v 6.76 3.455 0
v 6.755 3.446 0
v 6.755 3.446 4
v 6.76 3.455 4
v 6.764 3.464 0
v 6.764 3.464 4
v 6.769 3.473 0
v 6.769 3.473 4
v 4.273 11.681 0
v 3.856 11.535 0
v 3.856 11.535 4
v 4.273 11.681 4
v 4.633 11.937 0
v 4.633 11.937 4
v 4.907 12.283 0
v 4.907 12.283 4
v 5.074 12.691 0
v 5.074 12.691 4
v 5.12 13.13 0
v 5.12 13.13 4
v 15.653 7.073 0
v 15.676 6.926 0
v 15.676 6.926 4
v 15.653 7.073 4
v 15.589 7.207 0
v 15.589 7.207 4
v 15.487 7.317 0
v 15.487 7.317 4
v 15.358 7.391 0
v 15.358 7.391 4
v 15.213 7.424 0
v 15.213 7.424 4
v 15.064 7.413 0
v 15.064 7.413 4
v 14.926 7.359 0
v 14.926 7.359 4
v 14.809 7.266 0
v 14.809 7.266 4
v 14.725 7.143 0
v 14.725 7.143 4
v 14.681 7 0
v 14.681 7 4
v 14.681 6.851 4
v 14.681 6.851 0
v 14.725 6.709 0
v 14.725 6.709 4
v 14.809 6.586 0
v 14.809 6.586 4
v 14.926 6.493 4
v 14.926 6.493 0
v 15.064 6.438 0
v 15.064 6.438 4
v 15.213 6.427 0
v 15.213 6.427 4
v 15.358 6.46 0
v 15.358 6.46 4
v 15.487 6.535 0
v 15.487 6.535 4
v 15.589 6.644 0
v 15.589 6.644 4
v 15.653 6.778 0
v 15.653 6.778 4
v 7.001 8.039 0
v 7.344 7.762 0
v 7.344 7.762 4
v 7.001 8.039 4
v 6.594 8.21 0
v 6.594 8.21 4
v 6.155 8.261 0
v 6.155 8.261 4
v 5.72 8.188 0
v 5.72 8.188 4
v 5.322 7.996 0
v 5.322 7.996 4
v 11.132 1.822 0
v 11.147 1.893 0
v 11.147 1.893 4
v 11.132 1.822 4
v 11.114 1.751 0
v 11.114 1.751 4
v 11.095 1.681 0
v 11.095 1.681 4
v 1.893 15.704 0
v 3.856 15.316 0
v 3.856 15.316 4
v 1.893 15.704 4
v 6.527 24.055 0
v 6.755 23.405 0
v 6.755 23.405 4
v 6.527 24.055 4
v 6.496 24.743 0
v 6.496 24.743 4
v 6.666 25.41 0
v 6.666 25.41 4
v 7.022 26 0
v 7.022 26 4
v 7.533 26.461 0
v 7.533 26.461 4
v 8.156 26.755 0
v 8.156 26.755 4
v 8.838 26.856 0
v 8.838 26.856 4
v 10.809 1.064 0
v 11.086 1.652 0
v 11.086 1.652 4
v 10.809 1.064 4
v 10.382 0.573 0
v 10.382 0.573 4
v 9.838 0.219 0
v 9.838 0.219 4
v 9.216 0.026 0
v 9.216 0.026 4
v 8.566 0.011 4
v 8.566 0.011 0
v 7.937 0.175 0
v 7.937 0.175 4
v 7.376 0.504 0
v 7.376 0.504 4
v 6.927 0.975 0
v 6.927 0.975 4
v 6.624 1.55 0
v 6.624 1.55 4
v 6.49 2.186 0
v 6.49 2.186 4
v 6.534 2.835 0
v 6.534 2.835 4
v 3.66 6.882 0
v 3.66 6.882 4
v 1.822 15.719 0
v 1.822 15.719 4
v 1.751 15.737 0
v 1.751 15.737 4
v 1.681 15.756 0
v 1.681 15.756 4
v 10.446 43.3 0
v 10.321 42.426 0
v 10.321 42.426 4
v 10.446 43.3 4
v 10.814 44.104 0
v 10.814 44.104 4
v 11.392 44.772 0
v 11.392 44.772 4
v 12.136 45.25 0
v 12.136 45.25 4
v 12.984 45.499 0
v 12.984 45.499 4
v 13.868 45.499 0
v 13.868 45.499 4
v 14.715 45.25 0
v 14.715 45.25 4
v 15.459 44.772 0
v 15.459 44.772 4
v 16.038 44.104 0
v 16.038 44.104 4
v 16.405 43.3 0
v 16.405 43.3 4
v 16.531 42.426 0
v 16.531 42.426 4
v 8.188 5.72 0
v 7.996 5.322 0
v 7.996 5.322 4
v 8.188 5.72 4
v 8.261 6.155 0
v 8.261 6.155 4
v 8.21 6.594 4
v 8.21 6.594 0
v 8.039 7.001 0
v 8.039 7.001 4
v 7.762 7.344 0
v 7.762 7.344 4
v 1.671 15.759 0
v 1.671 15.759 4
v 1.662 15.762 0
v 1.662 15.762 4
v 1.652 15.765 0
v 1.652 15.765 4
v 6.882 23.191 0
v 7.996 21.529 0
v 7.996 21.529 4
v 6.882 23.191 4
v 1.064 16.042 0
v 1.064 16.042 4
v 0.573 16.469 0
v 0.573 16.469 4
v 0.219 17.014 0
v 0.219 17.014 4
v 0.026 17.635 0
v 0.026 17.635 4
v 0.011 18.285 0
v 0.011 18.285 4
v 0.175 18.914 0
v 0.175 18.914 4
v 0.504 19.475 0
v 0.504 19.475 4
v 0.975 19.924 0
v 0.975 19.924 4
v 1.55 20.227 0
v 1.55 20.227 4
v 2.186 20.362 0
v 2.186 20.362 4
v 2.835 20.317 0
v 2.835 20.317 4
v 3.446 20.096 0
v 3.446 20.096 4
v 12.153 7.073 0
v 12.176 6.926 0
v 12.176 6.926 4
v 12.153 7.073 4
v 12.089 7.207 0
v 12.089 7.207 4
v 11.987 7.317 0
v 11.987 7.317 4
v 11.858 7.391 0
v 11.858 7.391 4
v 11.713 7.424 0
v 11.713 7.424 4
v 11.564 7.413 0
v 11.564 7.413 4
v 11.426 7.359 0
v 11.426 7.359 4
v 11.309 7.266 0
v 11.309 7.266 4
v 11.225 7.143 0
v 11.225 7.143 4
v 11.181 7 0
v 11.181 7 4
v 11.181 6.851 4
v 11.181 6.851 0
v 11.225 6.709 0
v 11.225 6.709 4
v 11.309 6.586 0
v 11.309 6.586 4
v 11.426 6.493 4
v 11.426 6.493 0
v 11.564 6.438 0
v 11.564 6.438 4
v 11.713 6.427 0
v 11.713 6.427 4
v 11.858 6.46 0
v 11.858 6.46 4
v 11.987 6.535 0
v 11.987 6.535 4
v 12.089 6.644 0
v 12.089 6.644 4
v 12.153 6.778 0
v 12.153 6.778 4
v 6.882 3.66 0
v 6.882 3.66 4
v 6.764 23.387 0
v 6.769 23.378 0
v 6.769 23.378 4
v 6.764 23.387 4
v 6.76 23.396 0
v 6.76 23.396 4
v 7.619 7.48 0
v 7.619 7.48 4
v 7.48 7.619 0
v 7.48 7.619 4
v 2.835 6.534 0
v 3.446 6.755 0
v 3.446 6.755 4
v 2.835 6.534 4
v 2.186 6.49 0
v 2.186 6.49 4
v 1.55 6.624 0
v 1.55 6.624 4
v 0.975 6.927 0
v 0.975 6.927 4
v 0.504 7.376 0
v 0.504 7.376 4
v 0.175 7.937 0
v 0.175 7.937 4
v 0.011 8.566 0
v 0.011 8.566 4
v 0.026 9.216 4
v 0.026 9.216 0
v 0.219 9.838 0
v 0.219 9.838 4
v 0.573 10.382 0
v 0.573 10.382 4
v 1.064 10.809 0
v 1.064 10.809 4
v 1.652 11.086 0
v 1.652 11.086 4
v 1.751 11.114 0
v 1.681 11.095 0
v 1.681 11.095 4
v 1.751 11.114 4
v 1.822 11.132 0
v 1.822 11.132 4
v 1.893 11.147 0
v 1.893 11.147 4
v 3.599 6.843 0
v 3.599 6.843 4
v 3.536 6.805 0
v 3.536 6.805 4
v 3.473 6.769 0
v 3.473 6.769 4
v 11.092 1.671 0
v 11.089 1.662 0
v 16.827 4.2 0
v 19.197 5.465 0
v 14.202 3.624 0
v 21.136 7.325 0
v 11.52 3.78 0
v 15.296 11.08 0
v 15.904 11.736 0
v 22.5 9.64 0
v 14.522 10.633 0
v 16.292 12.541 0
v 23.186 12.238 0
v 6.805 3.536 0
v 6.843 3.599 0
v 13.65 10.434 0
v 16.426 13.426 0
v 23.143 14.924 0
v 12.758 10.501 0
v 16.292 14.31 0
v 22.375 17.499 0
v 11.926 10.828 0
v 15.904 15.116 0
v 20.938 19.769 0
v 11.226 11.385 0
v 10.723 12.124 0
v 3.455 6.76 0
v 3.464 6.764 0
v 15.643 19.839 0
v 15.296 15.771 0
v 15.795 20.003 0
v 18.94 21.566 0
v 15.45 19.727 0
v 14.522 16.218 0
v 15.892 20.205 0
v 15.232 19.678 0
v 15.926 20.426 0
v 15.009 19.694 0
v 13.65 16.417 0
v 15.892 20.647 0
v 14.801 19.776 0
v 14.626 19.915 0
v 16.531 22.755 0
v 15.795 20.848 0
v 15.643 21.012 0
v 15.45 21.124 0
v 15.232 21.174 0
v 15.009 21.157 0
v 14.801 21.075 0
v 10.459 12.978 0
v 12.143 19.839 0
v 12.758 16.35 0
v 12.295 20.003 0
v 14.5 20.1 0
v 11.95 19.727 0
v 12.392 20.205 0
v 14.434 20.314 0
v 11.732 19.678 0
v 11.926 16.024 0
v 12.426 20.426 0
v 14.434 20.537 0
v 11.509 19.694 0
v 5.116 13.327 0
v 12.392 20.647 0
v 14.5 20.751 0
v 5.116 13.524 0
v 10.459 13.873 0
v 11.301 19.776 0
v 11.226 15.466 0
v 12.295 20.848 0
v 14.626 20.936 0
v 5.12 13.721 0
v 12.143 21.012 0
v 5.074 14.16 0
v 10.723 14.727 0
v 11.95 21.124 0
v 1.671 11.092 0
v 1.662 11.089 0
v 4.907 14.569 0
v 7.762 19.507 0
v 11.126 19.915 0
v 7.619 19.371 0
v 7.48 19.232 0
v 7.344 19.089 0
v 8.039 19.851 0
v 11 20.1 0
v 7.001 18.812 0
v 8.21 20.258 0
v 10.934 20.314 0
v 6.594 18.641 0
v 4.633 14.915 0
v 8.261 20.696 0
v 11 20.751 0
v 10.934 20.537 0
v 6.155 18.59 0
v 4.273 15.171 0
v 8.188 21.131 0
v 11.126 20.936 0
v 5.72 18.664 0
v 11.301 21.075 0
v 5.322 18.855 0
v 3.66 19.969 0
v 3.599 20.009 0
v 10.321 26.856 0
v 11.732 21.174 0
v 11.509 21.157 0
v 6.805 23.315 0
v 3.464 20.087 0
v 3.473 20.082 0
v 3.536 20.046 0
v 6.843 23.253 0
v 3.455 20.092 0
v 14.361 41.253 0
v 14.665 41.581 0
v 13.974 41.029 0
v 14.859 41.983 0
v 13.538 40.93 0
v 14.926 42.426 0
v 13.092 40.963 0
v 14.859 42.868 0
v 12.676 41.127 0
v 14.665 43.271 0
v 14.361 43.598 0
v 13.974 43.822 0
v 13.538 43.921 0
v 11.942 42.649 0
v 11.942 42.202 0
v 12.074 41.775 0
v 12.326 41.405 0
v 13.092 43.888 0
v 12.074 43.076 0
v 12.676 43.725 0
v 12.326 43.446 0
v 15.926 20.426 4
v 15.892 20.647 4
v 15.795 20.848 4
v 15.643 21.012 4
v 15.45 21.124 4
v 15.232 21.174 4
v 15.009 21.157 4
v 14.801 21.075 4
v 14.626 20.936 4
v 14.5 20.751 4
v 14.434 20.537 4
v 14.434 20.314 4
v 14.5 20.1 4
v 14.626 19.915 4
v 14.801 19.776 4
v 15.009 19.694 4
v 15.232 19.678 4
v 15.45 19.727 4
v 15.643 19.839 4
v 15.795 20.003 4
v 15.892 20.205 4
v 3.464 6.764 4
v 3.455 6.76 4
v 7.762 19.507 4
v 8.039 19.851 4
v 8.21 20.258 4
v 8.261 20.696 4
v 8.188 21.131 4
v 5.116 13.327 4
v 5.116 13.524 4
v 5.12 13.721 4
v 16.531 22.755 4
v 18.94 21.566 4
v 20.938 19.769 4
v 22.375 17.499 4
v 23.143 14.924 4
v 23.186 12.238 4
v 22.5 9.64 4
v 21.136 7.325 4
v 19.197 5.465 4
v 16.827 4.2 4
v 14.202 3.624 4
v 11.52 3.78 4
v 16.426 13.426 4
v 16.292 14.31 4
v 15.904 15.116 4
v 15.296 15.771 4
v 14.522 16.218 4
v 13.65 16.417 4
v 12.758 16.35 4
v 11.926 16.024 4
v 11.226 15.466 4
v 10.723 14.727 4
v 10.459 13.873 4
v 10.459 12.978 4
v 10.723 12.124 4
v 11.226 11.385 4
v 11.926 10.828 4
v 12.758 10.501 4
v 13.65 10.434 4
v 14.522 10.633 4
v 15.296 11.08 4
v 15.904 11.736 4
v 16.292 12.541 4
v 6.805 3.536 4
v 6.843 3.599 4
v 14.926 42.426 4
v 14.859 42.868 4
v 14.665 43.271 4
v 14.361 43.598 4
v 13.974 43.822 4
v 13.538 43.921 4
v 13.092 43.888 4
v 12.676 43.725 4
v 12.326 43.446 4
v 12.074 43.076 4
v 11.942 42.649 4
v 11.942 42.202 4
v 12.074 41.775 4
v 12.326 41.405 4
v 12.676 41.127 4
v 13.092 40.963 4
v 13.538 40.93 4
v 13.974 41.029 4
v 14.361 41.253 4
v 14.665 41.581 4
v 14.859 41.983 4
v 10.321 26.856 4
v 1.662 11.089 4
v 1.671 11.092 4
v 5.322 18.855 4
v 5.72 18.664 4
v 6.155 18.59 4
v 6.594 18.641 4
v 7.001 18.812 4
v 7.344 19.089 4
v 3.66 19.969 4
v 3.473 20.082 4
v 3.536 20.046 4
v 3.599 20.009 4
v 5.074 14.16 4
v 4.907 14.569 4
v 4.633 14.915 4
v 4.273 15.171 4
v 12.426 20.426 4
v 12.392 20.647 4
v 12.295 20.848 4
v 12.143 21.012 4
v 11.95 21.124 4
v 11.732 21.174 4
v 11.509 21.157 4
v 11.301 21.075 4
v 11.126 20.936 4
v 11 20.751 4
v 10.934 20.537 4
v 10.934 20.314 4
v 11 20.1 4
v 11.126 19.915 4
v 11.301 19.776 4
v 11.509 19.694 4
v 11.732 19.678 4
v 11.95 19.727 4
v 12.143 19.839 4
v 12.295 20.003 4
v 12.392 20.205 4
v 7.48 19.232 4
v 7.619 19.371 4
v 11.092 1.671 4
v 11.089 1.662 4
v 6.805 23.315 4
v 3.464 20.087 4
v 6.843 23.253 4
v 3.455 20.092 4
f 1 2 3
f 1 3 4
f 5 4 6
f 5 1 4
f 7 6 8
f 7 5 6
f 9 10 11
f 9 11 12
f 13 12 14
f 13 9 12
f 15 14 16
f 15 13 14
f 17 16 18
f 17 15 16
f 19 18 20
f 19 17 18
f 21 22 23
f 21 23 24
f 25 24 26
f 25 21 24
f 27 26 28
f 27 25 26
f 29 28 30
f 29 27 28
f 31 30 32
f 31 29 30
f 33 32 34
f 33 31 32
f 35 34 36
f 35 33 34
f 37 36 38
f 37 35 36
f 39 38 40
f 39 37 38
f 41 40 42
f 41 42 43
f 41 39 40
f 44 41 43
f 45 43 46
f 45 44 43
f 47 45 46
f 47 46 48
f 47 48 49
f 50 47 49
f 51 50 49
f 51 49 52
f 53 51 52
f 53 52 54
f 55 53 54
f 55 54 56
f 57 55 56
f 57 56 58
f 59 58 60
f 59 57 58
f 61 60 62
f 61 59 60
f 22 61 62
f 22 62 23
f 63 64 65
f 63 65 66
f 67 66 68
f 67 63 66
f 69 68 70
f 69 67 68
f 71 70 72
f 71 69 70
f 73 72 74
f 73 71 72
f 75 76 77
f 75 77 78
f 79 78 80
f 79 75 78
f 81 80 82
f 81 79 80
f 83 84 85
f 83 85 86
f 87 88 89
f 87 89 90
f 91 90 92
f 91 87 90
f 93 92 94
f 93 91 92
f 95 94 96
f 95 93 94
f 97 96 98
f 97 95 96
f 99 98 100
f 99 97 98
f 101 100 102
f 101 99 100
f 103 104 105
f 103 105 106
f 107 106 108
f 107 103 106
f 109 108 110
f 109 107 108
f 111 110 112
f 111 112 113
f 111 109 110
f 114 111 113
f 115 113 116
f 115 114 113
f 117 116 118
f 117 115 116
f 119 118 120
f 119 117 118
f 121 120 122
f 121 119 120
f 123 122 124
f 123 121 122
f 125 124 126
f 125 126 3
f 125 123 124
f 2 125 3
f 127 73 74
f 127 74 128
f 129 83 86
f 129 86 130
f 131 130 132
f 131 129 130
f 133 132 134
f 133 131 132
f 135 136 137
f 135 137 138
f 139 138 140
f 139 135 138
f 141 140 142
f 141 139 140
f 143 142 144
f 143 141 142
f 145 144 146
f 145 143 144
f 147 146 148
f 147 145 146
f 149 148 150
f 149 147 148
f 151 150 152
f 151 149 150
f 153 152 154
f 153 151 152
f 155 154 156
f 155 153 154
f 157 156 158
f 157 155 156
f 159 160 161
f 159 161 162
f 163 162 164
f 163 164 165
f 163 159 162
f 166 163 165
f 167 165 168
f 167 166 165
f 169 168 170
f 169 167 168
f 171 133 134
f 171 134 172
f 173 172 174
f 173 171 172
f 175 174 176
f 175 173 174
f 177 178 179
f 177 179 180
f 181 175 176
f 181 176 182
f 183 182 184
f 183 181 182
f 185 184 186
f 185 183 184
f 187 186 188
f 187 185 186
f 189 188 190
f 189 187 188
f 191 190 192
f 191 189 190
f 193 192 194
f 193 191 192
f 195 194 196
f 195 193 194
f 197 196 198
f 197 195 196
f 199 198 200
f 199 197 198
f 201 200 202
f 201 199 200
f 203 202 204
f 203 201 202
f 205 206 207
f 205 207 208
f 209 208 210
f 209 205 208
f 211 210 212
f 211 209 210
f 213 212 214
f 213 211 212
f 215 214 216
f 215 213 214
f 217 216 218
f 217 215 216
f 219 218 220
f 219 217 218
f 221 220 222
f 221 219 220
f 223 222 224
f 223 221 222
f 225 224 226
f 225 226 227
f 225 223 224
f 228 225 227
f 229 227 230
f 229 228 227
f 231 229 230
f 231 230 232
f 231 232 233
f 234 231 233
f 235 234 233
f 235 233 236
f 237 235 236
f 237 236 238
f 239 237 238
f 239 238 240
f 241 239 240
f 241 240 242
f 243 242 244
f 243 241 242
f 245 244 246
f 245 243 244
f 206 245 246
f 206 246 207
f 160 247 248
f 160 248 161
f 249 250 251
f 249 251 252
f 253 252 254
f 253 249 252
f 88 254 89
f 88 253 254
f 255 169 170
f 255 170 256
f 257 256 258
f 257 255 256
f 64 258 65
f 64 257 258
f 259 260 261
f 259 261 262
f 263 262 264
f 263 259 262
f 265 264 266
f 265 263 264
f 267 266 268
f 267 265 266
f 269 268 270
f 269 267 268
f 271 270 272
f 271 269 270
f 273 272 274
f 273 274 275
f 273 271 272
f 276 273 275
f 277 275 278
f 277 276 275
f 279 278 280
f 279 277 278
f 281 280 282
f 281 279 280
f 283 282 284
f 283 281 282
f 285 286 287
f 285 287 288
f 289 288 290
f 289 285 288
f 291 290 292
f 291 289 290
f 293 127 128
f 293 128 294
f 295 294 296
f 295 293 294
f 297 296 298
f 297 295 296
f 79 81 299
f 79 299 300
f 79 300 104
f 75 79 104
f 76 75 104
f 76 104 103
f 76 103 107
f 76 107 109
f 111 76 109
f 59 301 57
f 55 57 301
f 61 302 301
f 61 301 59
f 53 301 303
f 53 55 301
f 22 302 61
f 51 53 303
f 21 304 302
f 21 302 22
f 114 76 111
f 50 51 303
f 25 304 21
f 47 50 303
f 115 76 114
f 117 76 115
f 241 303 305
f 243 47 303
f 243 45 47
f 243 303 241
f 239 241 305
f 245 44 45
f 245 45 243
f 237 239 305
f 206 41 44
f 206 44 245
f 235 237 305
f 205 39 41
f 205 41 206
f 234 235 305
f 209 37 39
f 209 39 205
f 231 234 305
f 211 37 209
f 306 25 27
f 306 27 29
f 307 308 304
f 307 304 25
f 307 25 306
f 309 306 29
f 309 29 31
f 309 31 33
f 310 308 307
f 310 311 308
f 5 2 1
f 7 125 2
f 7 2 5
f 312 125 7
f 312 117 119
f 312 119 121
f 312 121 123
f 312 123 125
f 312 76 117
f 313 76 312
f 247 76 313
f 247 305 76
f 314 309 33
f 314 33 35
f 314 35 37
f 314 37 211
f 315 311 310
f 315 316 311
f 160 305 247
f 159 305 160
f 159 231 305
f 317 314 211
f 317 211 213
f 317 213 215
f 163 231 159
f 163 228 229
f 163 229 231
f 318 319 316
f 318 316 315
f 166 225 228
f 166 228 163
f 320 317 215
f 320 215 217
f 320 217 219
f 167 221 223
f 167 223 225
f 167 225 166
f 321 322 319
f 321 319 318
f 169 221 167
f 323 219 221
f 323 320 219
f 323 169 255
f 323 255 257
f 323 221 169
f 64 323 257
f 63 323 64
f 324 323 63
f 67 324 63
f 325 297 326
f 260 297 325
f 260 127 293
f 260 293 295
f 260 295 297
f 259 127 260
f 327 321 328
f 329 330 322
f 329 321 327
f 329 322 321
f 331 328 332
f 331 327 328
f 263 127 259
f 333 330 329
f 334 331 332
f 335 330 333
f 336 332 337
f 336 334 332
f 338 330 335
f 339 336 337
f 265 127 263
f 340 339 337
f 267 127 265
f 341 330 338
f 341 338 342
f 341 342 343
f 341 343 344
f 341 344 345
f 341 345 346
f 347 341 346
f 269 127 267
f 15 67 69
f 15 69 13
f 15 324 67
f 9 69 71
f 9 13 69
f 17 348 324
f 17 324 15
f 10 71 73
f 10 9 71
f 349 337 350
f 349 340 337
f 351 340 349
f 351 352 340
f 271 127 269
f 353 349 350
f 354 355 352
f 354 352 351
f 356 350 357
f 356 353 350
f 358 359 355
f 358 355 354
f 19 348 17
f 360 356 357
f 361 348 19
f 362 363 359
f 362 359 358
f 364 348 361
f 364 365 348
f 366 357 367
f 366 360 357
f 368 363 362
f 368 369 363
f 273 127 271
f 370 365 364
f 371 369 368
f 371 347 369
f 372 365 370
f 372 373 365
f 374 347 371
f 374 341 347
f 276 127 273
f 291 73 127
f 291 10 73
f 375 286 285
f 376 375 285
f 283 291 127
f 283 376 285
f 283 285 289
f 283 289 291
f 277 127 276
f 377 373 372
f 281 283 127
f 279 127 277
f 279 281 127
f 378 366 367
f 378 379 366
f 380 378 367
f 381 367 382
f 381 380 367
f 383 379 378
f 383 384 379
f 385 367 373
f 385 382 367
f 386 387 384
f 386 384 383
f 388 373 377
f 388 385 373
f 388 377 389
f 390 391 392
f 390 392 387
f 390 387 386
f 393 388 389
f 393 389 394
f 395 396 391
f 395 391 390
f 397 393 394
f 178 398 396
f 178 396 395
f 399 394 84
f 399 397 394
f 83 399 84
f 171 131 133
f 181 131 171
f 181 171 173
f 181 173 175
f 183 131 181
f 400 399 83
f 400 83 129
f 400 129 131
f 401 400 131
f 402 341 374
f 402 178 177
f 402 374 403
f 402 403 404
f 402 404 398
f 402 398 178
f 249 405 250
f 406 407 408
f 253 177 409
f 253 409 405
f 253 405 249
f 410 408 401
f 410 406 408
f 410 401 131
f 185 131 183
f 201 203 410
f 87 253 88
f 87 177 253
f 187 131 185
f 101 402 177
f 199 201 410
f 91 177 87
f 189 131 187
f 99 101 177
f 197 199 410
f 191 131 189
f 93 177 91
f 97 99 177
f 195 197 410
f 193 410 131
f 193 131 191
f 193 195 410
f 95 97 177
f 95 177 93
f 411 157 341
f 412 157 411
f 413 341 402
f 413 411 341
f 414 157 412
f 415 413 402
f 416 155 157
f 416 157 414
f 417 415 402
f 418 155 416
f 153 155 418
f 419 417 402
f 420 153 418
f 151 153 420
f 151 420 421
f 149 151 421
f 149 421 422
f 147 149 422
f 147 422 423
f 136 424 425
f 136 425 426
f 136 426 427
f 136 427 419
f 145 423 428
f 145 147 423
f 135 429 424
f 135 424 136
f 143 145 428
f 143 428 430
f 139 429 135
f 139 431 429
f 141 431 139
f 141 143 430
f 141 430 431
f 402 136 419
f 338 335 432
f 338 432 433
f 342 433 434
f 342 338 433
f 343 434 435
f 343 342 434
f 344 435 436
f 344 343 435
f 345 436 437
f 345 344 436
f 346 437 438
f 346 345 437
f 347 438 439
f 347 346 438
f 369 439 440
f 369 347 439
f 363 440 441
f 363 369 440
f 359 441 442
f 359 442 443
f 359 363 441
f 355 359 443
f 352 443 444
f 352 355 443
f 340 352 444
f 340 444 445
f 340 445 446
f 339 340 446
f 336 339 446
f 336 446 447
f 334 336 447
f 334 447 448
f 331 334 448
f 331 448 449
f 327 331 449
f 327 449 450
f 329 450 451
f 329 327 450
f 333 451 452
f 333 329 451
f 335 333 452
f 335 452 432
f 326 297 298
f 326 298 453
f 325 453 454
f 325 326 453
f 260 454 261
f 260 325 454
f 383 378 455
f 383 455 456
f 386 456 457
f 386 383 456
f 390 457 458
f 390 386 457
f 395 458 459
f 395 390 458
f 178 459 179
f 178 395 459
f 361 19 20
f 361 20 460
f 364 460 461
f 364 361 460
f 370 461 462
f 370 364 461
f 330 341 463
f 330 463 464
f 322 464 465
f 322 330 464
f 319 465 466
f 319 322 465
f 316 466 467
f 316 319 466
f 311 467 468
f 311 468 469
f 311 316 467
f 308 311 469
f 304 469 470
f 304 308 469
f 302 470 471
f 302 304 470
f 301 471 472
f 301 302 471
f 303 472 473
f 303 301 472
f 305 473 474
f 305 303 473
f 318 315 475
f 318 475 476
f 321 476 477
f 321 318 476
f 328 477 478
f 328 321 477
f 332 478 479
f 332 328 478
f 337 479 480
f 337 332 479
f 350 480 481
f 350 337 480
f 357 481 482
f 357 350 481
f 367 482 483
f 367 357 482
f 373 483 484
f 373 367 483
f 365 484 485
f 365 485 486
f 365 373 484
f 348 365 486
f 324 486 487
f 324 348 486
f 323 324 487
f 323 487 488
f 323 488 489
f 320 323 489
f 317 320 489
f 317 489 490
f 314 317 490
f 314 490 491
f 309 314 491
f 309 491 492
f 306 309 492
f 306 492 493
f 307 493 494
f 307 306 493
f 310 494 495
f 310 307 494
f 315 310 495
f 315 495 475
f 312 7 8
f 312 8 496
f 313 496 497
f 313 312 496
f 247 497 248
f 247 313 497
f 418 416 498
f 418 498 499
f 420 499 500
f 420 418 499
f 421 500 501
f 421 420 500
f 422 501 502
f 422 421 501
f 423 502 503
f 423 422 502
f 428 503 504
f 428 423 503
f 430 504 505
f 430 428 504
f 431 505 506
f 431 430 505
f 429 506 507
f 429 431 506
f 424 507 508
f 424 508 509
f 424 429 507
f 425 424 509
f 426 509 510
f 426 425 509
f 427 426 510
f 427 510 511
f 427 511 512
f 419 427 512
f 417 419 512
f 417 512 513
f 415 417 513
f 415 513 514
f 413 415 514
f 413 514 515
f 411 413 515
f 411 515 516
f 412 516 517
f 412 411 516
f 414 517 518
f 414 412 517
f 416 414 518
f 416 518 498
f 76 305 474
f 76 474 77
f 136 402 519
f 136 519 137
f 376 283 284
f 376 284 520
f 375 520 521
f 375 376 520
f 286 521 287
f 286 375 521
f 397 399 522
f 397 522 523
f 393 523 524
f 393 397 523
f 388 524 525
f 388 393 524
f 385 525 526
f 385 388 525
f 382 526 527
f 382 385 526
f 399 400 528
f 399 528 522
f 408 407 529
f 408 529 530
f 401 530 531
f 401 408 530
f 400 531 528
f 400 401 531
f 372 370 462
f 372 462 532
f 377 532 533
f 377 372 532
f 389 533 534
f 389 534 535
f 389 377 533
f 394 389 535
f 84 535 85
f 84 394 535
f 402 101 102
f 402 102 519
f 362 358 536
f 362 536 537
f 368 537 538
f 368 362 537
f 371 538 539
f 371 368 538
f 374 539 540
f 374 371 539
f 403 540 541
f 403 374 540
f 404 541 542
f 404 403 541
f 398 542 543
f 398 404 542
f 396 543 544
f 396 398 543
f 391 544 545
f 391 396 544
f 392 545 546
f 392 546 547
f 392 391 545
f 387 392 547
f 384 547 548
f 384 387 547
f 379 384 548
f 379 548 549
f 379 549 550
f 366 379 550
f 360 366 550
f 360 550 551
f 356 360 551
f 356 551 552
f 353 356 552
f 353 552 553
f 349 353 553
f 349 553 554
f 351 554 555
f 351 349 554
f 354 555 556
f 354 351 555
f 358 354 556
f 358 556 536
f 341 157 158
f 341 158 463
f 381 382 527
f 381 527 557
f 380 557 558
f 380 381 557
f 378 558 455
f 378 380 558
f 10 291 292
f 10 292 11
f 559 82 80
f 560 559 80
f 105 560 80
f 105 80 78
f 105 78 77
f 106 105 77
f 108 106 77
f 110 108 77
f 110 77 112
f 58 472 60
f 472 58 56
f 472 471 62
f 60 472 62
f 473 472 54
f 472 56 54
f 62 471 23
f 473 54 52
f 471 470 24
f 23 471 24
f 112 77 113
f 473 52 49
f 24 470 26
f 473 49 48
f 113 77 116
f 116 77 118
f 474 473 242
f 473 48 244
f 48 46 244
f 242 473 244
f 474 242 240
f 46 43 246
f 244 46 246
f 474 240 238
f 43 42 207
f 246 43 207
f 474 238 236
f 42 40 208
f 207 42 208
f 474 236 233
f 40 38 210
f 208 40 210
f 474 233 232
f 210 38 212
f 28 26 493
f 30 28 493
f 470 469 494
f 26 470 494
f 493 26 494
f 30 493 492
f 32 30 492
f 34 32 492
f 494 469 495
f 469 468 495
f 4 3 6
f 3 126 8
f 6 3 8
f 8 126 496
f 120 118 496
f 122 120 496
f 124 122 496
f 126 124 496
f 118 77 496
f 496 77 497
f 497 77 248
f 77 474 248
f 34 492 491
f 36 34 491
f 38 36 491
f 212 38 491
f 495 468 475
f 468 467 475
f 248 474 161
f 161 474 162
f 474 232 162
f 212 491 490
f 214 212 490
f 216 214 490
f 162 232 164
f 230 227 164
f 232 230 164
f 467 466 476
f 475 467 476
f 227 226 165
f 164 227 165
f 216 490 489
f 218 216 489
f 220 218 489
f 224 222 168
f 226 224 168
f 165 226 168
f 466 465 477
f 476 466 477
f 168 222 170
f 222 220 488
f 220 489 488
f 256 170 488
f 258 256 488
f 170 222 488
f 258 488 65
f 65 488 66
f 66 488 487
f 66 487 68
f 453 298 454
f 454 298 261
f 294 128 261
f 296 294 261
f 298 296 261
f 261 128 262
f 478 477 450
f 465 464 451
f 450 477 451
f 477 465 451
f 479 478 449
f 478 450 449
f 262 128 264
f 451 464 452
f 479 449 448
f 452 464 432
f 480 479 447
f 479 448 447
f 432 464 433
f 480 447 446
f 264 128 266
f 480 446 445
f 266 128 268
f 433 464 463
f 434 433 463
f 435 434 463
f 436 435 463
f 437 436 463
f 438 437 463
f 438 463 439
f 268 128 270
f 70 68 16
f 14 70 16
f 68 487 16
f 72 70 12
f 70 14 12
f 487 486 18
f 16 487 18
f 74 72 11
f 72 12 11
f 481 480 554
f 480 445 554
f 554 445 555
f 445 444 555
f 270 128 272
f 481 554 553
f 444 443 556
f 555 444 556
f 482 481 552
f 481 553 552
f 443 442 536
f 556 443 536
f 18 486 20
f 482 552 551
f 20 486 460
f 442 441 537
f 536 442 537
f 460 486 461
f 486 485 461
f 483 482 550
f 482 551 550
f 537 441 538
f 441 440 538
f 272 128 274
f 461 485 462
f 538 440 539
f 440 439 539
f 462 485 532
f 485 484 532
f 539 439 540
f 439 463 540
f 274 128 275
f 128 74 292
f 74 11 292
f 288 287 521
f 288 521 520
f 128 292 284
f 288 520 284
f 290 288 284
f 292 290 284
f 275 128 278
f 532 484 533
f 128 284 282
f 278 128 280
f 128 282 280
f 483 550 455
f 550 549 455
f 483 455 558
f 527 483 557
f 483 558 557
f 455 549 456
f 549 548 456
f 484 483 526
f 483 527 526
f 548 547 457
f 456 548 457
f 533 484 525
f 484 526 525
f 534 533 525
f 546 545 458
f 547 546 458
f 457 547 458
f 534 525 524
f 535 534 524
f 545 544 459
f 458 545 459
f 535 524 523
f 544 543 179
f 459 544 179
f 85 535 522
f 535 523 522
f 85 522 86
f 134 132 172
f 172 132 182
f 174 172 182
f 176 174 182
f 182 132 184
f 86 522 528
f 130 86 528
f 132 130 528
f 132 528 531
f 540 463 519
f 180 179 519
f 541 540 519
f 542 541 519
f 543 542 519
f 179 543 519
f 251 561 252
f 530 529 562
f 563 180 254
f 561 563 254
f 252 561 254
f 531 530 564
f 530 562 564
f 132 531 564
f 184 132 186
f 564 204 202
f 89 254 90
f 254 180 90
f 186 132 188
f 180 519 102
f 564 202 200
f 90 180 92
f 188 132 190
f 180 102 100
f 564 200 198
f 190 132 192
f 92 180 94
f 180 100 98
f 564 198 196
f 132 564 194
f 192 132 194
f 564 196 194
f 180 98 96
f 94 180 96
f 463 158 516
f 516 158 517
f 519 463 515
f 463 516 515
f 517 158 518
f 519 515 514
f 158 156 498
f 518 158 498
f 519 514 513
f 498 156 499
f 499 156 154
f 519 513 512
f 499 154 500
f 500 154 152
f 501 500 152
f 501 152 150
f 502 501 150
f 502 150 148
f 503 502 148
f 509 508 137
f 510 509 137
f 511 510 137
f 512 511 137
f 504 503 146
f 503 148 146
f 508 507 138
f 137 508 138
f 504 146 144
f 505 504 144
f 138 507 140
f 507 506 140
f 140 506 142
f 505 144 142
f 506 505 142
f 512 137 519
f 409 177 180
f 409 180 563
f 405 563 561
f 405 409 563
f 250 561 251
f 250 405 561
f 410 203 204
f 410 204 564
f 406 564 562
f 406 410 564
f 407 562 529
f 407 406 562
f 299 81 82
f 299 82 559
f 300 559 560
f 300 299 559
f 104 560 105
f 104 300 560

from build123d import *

# Parameters (mm, degrees)
SKETCH1_R           = 1.5
SKETCH1_R_2         = 3
SKETCH1_R_3         = 0.75
SKETCH1_R_4         = 0.5
BOSS_EXTRUDE1_DEPTH = 4


with BuildPart() as part:
    # Sketch1 → Boss-Extrude1 (new body)
    with BuildSketch(Plane.XY):
        with BuildLine():
            Line((16.530619317, 42.42561819), (16.530619317, 22.754982115))
            ThreePointArc((16.530619317, 22.754982115), (22.932240754, 10.915198881), (11.519776525, 3.779592091))
            Line((11.519776525, 3.779592091), (11.147094023, 1.893337277))
            ThreePointArc((11.147094023, 1.893337277), (11.123415667, 1.786594657), (11.094806165, 1.681066709))
            ThreePointArc((11.094806165, 1.681066709), (11.090483266, 1.666641986), (11.086068179, 1.652245212))
            ThreePointArc((11.086068179, 1.652245212), (7.936966432, 0.174837955), (6.754899921, 3.446273846))
            ThreePointArc((6.754899921, 3.446273846), (6.761958039, 3.45957584), (6.769101108, 3.47283241))
            ThreePointArc((6.769101108, 3.47283241), (6.823490663, 3.567681911), (6.882225966, 3.659903468))
            Line((6.882225966, 3.659903468), (7.995950227, 5.322085893))
            ThreePointArc((7.995950227, 5.322085893), (8.251124429, 6.376170558), (7.761765041, 7.344021653))
            ThreePointArc((7.761765041, 7.344021653), (7.549180699, 7.549179572), (7.344022782, 7.761763916))
            ThreePointArc((7.344022782, 7.761763916), (6.376171685, 8.251123307), (5.322087019, 7.995949102))
            Line((5.322087019, 7.995949102), (3.659904592, 6.882224839))
            ThreePointArc((3.659904592, 6.882224839), (3.567683036, 6.823489535), (3.472833536, 6.769099981))
            ThreePointArc((3.472833536, 6.769099981), (3.459576965, 6.761956912), (3.446274971, 6.754898794))
            ThreePointArc((3.446274971, 6.754898794), (0.174839081, 7.936965304), (1.652246338, 11.086067052))
            ThreePointArc((1.652246338, 11.086067052), (1.666643112, 11.090482139), (1.681067834, 11.094805038))
            ThreePointArc((1.681067834, 11.094805038), (1.786595783, 11.12341454), (1.893338403, 11.147092897))
            Line((1.893338403, 11.147092897), (3.856200846, 11.534911383))
            ThreePointArc((3.856200846, 11.534911383), (4.781986668, 12.099826389), (5.120331397, 13.130229803))
            ThreePointArc((5.120331397, 13.130229803), (5.115080125, 13.425618189), (5.120331401, 13.721006575))
            ThreePointArc((5.120331401, 13.721006575), (4.781986671, 14.751409991), (3.856200847, 15.316324996))
            Line((3.856200847, 15.316324996), (1.893338402, 15.704143481))
            ThreePointArc((1.893338402, 15.704143481), (1.786595783, 15.72782184), (1.681067835, 15.756431342))
            ThreePointArc((1.681067835, 15.756431342), (1.666643112, 15.760754241), (1.652246339, 15.765169327))
            ThreePointArc((1.652246339, 15.765169327), (0.174839082, 18.914271075), (3.446274972, 20.096337586))
            ThreePointArc((3.446274972, 20.096337586), (3.459576966, 20.089279467), (3.472833537, 20.082136399))
            ThreePointArc((3.472833537, 20.082136399), (3.567683038, 20.027746844), (3.659904595, 19.969011541))
            Line((3.659904595, 19.969011541), (5.322087019, 18.855287277))
            ThreePointArc((5.322087019, 18.855287277), (6.376171684, 18.600113075), (7.344022779, 19.089472463))
            ThreePointArc((7.344022779, 19.089472463), (7.549180698, 19.302056807), (7.761765042, 19.507214725))
            ThreePointArc((7.761765042, 19.507214725), (8.251124432, 20.475065821), (7.995950227, 21.529150485))
            Line((7.995950227, 21.529150485), (6.882225965, 23.191332912))
            ThreePointArc((6.882225965, 23.191332912), (6.823490661, 23.283554468), (6.769101106, 23.378403968))
            ThreePointArc((6.769101106, 23.378403968), (6.761958038, 23.391660539), (6.754899919, 23.404962533))
            ThreePointArc((6.754899919, 23.404962533), (6.822518946, 25.718097901), (8.837784858, 26.855582349))
            Line((8.837784858, 26.855582349), (10.320619317, 26.855582349))
            Line((10.320619317, 26.855582349), (10.320619317, 42.42561819))
            ThreePointArc((10.320619317, 42.42561819), (13.425619317, 45.53061819), (16.530619317, 42.42561819))
        make_face()
        with Locations((13.425619317, 42.42561819)):
            Circle(SKETCH1_R, mode=Mode.SUBTRACT)
        with Locations((13.425619317, 13.42561819)):
            Circle(SKETCH1_R_2, mode=Mode.SUBTRACT)
        with Locations((11.675619317, 20.42561819)):
            Circle(SKETCH1_R_3, mode=Mode.SUBTRACT)
        with Locations((15.175619317, 20.42561819)):
            Circle(SKETCH1_R_3, mode=Mode.SUBTRACT)
        with Locations((11.675619317, 6.92561819)):
            Circle(SKETCH1_R_4, mode=Mode.SUBTRACT)
        with Locations((15.175619317, 6.92561819)):
            Circle(SKETCH1_R_4, mode=Mode.SUBTRACT)
    extrude(amount=BOSS_EXTRUDE1_DEPTH)


solid = part.part
